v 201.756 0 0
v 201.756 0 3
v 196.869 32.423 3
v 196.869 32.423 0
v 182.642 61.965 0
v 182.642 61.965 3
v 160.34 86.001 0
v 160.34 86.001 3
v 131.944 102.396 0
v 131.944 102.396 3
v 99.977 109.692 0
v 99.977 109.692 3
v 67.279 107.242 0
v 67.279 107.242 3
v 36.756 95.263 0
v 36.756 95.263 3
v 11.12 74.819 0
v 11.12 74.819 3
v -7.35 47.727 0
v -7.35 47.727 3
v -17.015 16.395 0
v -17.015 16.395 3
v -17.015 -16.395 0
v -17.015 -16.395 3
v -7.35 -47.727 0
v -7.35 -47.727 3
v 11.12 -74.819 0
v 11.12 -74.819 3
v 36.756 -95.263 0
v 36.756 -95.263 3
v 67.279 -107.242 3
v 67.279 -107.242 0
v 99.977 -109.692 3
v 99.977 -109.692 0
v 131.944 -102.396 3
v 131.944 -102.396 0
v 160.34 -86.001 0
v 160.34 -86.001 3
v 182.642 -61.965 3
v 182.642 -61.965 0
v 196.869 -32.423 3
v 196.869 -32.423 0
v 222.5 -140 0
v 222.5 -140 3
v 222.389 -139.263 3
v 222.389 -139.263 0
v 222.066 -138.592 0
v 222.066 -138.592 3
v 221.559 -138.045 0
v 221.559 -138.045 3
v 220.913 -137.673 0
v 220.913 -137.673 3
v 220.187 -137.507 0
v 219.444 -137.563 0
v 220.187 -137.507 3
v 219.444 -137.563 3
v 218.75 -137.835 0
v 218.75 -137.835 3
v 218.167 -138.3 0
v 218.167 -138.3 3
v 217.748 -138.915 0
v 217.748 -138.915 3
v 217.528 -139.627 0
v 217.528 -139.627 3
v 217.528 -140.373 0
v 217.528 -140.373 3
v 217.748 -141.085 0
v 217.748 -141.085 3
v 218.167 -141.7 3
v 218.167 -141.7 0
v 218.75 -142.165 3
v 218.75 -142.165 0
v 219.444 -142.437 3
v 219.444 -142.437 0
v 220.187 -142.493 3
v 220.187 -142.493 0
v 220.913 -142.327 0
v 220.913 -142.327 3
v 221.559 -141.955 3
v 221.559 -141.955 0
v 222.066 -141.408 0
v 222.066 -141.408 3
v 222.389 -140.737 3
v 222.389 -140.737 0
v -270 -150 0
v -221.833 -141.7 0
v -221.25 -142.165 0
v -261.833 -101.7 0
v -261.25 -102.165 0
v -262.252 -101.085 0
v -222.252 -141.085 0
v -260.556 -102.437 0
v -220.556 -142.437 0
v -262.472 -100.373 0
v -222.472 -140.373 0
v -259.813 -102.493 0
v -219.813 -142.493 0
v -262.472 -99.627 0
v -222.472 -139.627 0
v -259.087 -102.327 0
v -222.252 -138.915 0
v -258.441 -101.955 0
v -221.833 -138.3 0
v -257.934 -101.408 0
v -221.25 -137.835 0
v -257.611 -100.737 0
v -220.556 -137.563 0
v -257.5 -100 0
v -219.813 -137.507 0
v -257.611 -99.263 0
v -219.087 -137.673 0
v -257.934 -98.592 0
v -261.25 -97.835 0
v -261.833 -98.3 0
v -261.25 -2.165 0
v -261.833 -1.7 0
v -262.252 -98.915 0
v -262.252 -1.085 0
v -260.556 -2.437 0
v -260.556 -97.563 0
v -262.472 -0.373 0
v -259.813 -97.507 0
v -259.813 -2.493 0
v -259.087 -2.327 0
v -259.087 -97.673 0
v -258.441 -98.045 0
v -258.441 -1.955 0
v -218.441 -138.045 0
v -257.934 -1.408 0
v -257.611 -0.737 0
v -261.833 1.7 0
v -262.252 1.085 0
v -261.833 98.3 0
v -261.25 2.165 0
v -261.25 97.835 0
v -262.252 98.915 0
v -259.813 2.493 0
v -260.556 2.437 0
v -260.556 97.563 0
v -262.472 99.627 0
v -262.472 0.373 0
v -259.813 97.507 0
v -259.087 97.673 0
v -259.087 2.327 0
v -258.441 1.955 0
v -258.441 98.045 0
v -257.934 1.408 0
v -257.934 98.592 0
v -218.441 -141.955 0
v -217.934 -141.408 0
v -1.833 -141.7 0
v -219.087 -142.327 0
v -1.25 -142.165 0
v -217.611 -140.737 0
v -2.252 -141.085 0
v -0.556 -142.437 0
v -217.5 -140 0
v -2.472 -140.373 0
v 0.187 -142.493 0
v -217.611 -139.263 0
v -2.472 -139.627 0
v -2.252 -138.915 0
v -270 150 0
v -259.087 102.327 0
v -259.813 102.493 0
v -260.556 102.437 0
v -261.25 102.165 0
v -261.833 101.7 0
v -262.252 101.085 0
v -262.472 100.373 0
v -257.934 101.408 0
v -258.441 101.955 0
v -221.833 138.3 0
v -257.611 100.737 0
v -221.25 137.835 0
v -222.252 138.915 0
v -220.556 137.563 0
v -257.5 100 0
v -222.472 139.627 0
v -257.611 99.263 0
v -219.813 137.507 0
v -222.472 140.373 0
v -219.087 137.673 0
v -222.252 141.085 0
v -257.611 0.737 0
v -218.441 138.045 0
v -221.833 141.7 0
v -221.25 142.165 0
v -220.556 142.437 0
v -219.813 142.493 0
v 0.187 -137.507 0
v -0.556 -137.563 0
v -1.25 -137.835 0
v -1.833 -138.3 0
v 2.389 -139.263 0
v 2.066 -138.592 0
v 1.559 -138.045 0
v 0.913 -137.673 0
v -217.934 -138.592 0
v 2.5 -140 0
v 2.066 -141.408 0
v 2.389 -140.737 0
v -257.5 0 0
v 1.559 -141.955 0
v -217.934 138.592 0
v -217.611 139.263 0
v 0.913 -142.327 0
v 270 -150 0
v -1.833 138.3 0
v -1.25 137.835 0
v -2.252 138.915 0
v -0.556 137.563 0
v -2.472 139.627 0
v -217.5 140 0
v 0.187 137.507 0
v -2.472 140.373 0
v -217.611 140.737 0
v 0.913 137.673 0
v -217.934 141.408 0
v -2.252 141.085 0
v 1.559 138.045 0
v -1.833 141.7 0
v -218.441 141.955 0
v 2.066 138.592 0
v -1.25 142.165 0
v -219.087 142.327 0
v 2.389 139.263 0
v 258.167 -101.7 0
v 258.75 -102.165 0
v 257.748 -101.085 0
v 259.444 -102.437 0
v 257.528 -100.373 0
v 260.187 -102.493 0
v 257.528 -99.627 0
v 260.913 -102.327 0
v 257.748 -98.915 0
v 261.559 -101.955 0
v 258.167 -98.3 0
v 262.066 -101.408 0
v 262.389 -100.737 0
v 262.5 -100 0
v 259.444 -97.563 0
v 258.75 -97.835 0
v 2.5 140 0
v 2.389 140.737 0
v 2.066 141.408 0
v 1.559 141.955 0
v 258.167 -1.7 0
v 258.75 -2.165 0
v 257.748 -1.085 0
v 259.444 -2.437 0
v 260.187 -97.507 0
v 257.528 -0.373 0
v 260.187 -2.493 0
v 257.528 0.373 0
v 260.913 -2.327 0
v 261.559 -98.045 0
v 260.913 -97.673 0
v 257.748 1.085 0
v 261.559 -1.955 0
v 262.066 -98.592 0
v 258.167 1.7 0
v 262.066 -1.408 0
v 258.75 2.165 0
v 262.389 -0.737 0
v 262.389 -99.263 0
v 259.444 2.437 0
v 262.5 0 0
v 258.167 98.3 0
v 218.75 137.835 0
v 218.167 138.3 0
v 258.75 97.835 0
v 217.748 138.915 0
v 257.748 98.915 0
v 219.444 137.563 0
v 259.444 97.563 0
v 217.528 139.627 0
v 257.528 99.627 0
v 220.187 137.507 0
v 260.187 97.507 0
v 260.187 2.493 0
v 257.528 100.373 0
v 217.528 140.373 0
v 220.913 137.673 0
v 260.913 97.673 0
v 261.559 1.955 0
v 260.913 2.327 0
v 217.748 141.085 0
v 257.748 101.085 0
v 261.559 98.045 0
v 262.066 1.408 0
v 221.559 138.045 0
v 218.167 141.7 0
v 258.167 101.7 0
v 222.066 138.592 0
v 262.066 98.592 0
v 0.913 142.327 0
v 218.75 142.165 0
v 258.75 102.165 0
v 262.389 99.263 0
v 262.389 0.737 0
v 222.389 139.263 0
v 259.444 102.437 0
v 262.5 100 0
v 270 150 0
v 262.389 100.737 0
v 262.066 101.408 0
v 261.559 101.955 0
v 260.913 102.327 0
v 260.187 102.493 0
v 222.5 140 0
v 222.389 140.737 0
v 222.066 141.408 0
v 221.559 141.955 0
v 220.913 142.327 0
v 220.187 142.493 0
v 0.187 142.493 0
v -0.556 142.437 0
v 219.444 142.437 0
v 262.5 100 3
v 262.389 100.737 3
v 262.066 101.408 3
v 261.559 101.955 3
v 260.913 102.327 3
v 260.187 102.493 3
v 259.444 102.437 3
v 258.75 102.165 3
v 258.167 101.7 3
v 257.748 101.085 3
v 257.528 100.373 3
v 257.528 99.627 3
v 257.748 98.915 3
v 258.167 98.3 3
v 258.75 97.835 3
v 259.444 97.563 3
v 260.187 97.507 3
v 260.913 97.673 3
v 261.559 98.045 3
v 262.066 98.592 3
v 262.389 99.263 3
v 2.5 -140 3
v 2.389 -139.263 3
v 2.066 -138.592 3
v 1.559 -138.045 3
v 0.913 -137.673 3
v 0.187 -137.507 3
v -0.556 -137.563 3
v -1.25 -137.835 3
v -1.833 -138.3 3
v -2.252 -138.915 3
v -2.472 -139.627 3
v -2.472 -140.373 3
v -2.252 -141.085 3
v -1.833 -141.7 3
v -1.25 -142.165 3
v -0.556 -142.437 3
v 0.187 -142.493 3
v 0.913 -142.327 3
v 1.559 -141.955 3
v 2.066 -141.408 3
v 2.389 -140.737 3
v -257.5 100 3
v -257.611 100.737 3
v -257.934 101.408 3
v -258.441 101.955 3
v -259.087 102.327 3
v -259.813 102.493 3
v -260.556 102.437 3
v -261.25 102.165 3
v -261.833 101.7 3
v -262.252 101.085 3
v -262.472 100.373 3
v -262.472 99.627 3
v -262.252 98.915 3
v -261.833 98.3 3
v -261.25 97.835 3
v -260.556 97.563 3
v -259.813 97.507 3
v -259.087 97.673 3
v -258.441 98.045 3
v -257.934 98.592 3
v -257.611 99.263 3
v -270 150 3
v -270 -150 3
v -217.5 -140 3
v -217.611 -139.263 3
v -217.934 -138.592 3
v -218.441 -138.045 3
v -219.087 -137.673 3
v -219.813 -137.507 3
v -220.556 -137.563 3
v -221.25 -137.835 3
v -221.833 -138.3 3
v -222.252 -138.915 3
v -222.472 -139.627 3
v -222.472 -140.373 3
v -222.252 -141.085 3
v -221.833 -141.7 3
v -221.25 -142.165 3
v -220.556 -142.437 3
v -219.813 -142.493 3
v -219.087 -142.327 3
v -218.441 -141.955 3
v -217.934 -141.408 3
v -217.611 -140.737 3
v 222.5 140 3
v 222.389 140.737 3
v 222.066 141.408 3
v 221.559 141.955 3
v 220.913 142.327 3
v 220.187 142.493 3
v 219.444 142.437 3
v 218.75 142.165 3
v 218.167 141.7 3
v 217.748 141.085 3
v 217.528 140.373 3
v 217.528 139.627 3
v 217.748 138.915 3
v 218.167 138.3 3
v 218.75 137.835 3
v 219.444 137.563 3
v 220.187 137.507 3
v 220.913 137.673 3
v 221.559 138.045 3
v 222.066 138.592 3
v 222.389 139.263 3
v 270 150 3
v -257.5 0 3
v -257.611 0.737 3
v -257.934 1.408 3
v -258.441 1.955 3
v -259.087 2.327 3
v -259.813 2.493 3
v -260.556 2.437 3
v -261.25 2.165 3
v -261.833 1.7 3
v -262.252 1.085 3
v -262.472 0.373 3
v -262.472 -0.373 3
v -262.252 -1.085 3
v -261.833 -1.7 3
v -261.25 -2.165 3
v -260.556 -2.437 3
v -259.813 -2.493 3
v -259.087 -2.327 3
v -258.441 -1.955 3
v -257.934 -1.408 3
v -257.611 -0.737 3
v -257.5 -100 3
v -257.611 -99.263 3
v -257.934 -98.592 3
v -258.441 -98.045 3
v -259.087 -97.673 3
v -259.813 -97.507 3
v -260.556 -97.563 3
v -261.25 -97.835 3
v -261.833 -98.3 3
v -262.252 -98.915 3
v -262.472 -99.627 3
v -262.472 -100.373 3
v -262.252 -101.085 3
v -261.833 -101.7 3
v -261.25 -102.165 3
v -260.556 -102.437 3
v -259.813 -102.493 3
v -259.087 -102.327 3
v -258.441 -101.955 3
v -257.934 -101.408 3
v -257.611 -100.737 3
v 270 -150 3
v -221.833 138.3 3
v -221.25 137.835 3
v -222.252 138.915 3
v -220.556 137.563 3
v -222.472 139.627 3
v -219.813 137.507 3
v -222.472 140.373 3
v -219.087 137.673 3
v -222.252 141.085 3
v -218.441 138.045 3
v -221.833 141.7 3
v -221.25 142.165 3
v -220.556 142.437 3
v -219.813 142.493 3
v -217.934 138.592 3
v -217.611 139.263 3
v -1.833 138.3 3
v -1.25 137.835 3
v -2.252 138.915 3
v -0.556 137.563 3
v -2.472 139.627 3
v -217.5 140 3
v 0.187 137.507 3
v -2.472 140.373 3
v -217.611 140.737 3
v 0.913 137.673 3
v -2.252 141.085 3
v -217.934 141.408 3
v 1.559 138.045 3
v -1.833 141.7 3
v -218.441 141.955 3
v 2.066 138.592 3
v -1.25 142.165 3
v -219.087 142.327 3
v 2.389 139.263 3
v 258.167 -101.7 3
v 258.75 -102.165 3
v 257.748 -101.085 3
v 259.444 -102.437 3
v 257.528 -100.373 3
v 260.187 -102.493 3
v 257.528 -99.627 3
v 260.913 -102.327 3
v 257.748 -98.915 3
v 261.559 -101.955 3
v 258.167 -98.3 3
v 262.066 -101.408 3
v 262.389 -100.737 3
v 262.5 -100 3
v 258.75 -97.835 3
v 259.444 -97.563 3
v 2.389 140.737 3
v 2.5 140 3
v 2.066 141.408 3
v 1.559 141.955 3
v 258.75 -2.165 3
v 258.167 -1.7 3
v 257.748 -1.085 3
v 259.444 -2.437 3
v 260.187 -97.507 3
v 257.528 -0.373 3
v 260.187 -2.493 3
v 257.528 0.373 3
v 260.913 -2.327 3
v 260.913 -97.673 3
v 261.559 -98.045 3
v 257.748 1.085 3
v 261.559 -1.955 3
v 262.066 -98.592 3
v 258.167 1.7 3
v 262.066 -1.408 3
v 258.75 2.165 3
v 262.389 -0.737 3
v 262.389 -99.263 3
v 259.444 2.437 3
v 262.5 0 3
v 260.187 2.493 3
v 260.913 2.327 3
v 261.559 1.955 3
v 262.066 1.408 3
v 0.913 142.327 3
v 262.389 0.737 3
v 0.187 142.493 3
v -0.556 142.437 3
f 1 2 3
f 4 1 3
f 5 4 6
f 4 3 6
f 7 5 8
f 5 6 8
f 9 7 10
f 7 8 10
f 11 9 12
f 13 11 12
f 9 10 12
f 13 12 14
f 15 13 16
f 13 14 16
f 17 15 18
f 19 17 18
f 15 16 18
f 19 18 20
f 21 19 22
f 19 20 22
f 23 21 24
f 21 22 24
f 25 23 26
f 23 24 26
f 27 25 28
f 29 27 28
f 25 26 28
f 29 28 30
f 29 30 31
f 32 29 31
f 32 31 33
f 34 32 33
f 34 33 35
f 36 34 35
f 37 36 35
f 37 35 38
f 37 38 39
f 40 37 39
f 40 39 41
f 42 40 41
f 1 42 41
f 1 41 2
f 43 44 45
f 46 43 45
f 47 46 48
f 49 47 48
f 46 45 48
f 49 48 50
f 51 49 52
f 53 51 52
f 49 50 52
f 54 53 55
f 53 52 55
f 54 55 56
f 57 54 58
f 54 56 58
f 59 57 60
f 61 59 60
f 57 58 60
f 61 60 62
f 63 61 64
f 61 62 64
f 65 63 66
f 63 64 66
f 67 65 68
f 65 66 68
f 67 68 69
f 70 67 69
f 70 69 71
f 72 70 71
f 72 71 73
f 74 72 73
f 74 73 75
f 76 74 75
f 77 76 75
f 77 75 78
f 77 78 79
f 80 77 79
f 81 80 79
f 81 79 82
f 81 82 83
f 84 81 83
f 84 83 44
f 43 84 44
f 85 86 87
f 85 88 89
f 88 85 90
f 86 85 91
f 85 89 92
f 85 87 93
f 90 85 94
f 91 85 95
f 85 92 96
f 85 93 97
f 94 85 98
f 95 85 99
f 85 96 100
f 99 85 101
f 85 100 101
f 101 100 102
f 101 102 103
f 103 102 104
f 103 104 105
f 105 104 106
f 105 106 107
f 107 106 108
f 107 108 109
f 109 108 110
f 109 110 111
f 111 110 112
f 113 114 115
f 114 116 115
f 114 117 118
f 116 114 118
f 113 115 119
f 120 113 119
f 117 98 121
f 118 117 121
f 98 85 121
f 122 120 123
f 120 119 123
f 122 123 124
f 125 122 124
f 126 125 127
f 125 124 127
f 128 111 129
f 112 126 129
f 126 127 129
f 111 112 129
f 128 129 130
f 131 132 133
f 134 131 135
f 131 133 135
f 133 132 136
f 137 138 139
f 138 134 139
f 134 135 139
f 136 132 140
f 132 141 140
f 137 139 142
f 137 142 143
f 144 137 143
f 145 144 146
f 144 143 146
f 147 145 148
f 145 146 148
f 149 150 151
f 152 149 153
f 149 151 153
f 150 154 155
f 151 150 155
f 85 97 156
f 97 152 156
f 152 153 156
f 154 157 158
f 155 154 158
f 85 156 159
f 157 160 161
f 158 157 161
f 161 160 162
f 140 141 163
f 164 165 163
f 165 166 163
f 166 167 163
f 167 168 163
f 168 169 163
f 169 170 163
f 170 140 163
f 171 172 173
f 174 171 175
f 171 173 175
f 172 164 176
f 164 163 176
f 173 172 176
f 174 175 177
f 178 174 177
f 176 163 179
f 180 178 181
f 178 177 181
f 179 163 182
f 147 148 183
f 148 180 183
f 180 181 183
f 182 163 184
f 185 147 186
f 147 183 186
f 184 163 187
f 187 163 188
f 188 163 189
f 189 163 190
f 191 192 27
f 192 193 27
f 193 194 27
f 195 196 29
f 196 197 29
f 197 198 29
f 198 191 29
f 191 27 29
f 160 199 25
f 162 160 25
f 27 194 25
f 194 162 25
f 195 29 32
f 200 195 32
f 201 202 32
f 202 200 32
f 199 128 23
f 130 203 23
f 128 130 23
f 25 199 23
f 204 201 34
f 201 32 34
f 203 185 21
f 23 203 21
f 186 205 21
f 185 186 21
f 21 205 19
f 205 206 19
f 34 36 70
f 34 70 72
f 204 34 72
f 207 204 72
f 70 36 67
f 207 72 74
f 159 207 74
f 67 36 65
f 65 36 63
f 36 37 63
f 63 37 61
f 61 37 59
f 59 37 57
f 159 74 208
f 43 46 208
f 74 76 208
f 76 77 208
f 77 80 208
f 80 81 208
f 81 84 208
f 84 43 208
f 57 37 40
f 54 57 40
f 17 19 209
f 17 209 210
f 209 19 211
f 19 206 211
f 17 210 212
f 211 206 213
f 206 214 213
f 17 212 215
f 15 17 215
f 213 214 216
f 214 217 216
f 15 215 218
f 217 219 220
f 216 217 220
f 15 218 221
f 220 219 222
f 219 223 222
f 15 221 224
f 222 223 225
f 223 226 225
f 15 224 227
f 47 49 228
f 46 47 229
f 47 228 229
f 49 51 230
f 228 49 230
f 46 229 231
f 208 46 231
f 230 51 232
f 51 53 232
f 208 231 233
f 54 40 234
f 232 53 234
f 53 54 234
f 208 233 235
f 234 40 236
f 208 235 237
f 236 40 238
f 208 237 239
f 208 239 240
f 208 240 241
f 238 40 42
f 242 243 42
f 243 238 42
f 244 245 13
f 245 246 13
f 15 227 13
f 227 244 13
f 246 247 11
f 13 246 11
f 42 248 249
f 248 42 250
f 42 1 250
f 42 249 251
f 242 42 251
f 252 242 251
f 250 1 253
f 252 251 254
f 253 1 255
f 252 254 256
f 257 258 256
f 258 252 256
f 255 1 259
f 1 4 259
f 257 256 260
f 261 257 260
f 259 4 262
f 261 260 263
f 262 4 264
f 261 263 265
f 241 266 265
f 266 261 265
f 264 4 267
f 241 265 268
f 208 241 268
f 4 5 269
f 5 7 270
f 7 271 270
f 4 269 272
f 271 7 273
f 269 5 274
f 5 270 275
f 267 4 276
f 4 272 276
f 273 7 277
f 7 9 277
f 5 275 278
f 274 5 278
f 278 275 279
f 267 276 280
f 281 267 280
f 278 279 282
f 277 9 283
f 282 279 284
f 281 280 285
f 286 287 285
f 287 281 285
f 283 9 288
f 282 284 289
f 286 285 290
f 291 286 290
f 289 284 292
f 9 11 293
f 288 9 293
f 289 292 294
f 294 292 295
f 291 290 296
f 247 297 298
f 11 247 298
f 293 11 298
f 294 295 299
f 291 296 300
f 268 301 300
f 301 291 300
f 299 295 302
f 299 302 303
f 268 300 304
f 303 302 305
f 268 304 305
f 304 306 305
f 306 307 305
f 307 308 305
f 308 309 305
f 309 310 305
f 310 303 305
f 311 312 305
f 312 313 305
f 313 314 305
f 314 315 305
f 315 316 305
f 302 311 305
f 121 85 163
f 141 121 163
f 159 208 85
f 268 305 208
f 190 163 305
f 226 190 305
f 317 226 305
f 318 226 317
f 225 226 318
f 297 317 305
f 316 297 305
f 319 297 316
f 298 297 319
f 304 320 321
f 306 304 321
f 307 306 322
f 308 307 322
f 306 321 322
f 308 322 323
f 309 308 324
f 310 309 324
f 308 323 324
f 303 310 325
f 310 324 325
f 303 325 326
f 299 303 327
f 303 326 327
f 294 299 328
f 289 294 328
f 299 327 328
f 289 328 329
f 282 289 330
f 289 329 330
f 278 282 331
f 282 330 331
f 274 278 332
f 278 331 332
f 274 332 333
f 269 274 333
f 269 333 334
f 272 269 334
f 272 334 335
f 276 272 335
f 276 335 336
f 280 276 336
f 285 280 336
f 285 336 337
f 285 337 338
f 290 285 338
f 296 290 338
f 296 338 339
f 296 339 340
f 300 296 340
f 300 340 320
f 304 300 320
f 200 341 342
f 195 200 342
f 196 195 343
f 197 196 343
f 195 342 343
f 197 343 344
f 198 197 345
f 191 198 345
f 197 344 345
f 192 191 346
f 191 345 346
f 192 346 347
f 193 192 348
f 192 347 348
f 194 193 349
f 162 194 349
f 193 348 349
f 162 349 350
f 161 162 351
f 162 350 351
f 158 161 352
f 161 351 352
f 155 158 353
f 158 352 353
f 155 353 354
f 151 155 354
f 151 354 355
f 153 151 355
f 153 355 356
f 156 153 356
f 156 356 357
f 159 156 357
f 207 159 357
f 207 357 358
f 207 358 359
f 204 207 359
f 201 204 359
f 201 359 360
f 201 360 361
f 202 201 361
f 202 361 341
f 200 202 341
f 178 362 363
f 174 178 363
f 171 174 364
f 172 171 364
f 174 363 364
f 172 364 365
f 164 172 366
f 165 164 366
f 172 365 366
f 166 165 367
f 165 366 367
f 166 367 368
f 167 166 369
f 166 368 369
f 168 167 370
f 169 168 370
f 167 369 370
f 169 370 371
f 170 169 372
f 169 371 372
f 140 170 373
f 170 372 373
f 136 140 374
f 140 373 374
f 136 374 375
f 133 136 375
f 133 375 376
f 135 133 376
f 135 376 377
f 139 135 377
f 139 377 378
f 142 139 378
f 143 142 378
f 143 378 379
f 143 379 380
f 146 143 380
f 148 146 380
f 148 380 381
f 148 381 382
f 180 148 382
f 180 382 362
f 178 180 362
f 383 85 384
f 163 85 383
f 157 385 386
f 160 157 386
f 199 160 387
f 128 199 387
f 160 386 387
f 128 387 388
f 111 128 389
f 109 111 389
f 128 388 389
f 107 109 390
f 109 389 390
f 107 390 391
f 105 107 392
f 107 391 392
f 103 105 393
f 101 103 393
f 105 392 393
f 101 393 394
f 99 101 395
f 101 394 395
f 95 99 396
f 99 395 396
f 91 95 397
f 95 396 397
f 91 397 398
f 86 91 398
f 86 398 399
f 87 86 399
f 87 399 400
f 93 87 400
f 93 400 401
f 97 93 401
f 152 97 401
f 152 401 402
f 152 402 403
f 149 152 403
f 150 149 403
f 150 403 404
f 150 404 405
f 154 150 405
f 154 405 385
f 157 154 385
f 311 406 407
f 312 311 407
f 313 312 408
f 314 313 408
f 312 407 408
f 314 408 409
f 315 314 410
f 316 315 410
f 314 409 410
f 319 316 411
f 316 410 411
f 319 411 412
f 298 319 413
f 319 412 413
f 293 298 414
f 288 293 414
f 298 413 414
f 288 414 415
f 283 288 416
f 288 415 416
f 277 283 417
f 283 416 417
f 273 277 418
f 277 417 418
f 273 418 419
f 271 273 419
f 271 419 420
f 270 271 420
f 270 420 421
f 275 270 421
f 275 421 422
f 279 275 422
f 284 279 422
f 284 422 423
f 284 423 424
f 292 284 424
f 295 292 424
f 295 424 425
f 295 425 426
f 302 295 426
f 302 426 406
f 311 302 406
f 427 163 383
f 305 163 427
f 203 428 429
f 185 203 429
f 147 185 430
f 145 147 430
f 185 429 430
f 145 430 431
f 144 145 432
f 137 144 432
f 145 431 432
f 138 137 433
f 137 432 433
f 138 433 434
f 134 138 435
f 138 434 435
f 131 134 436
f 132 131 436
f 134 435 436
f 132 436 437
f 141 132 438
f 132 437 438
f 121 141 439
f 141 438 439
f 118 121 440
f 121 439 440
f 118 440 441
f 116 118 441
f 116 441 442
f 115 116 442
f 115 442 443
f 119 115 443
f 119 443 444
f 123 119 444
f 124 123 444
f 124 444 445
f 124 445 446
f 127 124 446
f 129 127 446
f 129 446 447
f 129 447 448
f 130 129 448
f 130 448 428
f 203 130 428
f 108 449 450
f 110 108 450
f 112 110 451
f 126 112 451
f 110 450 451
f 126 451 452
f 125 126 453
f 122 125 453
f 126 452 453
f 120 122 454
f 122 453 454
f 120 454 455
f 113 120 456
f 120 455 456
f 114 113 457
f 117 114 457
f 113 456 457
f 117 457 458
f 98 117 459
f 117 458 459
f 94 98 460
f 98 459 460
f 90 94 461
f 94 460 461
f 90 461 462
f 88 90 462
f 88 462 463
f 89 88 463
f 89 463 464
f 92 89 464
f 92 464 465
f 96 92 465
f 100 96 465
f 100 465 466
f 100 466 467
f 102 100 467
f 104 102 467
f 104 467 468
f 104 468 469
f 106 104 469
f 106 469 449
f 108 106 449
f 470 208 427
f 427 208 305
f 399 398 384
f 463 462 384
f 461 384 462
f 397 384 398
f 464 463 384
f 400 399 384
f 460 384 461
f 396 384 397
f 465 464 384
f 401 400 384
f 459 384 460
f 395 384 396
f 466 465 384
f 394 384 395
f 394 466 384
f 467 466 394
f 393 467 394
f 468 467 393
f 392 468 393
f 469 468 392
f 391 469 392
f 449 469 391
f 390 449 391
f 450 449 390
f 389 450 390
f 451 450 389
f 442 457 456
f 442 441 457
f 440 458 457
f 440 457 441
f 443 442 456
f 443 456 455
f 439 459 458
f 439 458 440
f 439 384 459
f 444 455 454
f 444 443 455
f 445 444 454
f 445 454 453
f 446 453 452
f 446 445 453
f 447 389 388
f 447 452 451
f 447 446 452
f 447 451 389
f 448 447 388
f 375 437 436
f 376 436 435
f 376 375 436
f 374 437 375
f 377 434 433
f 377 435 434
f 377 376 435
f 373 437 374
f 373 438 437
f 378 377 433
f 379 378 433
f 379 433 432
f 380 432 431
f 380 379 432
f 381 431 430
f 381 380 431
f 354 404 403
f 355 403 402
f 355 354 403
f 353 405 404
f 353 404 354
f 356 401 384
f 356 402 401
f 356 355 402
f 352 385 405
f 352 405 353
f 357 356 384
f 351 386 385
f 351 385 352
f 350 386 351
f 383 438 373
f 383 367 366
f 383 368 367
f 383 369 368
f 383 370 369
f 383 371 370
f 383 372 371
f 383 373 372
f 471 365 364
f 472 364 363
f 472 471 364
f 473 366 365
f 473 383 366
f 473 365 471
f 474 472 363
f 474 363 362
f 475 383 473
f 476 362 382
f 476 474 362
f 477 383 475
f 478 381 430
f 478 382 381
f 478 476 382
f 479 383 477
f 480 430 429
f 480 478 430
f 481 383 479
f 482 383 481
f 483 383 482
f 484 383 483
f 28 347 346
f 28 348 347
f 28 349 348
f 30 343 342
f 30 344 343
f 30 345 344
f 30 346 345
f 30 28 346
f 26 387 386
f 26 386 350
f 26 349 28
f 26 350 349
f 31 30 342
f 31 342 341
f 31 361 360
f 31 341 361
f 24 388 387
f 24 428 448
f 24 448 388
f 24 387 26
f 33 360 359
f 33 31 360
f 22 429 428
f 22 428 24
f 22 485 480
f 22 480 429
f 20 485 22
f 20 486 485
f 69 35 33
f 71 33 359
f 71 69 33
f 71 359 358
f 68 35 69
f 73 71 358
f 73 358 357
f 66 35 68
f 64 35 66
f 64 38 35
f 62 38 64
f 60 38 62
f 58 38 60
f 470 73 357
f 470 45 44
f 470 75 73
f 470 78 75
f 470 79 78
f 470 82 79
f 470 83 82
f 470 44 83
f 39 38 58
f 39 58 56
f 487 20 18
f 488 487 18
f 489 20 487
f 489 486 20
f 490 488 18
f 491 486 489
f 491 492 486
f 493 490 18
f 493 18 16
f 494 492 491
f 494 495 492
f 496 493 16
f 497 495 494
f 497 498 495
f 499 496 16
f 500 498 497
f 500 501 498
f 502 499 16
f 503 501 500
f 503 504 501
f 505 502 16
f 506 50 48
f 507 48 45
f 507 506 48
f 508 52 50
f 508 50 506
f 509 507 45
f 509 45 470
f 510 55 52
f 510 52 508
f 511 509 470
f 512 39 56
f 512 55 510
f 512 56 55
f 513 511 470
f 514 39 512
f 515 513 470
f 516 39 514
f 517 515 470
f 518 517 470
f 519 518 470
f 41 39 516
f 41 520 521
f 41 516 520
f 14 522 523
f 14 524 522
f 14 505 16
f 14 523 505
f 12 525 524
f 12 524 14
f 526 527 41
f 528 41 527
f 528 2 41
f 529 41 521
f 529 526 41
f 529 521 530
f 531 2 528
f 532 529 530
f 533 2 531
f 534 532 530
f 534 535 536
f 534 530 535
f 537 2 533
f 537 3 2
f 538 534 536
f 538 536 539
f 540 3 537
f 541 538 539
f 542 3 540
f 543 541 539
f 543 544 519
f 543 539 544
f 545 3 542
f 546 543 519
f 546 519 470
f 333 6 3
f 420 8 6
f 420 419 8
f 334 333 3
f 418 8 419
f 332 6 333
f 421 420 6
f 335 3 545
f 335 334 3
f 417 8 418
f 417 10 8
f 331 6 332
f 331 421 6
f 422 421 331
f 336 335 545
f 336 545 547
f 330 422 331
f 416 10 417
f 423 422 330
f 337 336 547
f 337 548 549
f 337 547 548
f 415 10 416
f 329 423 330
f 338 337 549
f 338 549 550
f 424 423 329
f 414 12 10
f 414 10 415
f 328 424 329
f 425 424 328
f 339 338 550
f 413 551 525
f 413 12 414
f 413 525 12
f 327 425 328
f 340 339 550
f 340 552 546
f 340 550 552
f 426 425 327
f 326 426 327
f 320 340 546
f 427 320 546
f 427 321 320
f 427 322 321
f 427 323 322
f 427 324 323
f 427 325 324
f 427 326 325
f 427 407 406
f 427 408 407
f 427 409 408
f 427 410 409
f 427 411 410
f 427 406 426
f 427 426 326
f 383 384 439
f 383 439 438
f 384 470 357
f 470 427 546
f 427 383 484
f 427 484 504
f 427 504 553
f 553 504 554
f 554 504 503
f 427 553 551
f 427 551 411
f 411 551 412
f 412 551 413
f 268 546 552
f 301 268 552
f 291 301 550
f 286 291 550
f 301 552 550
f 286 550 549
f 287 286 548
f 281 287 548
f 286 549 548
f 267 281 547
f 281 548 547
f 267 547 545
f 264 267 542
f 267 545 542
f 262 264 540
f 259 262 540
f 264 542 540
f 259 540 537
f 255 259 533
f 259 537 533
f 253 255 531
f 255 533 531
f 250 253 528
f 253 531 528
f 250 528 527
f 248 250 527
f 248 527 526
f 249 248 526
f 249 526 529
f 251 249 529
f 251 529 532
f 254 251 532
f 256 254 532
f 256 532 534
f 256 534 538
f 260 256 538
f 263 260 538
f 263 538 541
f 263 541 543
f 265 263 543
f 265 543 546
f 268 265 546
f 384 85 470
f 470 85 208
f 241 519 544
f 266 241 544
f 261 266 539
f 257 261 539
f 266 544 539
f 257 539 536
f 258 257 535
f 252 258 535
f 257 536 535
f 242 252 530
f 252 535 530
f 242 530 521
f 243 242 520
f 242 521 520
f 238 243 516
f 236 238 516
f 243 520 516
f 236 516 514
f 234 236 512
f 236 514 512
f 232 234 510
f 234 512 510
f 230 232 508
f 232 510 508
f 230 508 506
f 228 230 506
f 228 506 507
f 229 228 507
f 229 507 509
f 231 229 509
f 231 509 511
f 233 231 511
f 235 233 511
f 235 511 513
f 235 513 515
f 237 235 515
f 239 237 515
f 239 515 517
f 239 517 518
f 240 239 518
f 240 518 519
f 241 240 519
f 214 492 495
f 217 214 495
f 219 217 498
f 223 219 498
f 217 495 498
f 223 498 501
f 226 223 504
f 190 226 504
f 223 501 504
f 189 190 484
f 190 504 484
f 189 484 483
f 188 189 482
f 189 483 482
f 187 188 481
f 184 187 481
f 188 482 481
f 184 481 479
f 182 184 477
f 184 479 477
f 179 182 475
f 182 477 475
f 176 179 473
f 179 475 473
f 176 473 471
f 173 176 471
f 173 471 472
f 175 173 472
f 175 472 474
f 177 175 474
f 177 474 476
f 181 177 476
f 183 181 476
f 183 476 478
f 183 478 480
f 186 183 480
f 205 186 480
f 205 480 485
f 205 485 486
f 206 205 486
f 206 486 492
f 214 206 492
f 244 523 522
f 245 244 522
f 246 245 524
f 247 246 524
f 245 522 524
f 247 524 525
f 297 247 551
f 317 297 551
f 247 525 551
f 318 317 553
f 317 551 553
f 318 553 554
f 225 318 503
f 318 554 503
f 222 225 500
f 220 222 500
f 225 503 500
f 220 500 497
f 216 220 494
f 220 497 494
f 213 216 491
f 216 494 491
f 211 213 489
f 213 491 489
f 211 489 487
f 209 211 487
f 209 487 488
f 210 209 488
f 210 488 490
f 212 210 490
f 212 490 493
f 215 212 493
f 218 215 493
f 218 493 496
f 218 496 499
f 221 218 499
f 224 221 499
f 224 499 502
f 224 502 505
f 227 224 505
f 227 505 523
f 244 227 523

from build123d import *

# Parameters (mm, degrees)
CROQUIS1_W              = 540
CROQUIS1_H              = 300
SALIENTE_EXTRUIR1_DEPTH = 3
CROQUIS2_R              = 2.5
CORTAR_EXTRUIR1_DEPTH   = 4
CROQUIS3_R              = 110
CORTAR_EXTRUIR2_DEPTH   = 4


with BuildPart() as part:
    # Croquis1 → Saliente-Extruir1 (new body)
    with BuildSketch(Plane.XY):
        Rectangle(CROQUIS1_W, CROQUIS1_H)
    extrude(amount=SALIENTE_EXTRUIR1_DEPTH)

    # Croquis2 → Cortar-Extruir1 (cut, through all)
    with BuildSketch(Plane.XY.offset(3)):
        with Locations((0, 140)):
            Circle(CROQUIS2_R)
        with Locations((-220, 140)):
            Circle(CROQUIS2_R)
        with Locations((-260, 0)):
            Circle(CROQUIS2_R)
        with Locations((-260, 100)):
            Circle(CROQUIS2_R)
        with Locations((-260, -100)):
            Circle(CROQUIS2_R)
        with Locations((220, 140)):
            Circle(CROQUIS2_R)
        with Locations((260, -100)):
            Circle(CROQUIS2_R)
        with Locations((260, 0)):
            Circle(CROQUIS2_R)
        with Locations((260, 100)):
            Circle(CROQUIS2_R)
        with Locations((220, -140)):
            Circle(CROQUIS2_R)
        with Locations((0, -140)):
            Circle(CROQUIS2_R)
        with Locations((-220, -140)):
            Circle(CROQUIS2_R)
    extrude(amount=-CORTAR_EXTRUIR1_DEPTH, mode=Mode.SUBTRACT)

    # Croquis3 → Cortar-Extruir2 (cut, through all)
    with BuildSketch(Plane.XY.offset(3)):
        with Locations((91.756190819, 0)):
            Circle(CROQUIS3_R)
    extrude(amount=-CORTAR_EXTRUIR2_DEPTH, mode=Mode.SUBTRACT)


solid = part.part
